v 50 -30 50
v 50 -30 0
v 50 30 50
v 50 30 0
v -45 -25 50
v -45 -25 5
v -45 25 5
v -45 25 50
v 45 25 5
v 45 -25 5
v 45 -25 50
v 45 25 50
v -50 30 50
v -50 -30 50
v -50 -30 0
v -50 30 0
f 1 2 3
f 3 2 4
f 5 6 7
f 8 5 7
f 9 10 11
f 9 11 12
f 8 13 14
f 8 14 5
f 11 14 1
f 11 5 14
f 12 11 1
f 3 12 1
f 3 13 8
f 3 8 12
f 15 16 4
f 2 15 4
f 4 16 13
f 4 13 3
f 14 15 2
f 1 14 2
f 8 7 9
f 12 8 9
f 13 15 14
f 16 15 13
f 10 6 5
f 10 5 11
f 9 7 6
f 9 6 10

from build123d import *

# Parameters (mm, degrees)
SKETCH_1_W      = 100
SKETCH_1_H      = 60
EXTRUDE_1_DEPTH = 50
SHELL_1_T       = -5


with BuildPart() as part:
    # 草图1 → 凸台-拉伸1 (new body)
    with BuildSketch(Plane.XY):
        Rectangle(SKETCH_1_W, SKETCH_1_H)
    extrude(amount=EXTRUDE_1_DEPTH)

    # 抽壳1
    shell_1_openings = [part.faces().sort_by_distance(p)[0] for p in [
        (0, 0, 50),
    ]]
    offset(amount=SHELL_1_T, openings=shell_1_openings, kind=Kind.INTERSECTION)


solid = part.part
